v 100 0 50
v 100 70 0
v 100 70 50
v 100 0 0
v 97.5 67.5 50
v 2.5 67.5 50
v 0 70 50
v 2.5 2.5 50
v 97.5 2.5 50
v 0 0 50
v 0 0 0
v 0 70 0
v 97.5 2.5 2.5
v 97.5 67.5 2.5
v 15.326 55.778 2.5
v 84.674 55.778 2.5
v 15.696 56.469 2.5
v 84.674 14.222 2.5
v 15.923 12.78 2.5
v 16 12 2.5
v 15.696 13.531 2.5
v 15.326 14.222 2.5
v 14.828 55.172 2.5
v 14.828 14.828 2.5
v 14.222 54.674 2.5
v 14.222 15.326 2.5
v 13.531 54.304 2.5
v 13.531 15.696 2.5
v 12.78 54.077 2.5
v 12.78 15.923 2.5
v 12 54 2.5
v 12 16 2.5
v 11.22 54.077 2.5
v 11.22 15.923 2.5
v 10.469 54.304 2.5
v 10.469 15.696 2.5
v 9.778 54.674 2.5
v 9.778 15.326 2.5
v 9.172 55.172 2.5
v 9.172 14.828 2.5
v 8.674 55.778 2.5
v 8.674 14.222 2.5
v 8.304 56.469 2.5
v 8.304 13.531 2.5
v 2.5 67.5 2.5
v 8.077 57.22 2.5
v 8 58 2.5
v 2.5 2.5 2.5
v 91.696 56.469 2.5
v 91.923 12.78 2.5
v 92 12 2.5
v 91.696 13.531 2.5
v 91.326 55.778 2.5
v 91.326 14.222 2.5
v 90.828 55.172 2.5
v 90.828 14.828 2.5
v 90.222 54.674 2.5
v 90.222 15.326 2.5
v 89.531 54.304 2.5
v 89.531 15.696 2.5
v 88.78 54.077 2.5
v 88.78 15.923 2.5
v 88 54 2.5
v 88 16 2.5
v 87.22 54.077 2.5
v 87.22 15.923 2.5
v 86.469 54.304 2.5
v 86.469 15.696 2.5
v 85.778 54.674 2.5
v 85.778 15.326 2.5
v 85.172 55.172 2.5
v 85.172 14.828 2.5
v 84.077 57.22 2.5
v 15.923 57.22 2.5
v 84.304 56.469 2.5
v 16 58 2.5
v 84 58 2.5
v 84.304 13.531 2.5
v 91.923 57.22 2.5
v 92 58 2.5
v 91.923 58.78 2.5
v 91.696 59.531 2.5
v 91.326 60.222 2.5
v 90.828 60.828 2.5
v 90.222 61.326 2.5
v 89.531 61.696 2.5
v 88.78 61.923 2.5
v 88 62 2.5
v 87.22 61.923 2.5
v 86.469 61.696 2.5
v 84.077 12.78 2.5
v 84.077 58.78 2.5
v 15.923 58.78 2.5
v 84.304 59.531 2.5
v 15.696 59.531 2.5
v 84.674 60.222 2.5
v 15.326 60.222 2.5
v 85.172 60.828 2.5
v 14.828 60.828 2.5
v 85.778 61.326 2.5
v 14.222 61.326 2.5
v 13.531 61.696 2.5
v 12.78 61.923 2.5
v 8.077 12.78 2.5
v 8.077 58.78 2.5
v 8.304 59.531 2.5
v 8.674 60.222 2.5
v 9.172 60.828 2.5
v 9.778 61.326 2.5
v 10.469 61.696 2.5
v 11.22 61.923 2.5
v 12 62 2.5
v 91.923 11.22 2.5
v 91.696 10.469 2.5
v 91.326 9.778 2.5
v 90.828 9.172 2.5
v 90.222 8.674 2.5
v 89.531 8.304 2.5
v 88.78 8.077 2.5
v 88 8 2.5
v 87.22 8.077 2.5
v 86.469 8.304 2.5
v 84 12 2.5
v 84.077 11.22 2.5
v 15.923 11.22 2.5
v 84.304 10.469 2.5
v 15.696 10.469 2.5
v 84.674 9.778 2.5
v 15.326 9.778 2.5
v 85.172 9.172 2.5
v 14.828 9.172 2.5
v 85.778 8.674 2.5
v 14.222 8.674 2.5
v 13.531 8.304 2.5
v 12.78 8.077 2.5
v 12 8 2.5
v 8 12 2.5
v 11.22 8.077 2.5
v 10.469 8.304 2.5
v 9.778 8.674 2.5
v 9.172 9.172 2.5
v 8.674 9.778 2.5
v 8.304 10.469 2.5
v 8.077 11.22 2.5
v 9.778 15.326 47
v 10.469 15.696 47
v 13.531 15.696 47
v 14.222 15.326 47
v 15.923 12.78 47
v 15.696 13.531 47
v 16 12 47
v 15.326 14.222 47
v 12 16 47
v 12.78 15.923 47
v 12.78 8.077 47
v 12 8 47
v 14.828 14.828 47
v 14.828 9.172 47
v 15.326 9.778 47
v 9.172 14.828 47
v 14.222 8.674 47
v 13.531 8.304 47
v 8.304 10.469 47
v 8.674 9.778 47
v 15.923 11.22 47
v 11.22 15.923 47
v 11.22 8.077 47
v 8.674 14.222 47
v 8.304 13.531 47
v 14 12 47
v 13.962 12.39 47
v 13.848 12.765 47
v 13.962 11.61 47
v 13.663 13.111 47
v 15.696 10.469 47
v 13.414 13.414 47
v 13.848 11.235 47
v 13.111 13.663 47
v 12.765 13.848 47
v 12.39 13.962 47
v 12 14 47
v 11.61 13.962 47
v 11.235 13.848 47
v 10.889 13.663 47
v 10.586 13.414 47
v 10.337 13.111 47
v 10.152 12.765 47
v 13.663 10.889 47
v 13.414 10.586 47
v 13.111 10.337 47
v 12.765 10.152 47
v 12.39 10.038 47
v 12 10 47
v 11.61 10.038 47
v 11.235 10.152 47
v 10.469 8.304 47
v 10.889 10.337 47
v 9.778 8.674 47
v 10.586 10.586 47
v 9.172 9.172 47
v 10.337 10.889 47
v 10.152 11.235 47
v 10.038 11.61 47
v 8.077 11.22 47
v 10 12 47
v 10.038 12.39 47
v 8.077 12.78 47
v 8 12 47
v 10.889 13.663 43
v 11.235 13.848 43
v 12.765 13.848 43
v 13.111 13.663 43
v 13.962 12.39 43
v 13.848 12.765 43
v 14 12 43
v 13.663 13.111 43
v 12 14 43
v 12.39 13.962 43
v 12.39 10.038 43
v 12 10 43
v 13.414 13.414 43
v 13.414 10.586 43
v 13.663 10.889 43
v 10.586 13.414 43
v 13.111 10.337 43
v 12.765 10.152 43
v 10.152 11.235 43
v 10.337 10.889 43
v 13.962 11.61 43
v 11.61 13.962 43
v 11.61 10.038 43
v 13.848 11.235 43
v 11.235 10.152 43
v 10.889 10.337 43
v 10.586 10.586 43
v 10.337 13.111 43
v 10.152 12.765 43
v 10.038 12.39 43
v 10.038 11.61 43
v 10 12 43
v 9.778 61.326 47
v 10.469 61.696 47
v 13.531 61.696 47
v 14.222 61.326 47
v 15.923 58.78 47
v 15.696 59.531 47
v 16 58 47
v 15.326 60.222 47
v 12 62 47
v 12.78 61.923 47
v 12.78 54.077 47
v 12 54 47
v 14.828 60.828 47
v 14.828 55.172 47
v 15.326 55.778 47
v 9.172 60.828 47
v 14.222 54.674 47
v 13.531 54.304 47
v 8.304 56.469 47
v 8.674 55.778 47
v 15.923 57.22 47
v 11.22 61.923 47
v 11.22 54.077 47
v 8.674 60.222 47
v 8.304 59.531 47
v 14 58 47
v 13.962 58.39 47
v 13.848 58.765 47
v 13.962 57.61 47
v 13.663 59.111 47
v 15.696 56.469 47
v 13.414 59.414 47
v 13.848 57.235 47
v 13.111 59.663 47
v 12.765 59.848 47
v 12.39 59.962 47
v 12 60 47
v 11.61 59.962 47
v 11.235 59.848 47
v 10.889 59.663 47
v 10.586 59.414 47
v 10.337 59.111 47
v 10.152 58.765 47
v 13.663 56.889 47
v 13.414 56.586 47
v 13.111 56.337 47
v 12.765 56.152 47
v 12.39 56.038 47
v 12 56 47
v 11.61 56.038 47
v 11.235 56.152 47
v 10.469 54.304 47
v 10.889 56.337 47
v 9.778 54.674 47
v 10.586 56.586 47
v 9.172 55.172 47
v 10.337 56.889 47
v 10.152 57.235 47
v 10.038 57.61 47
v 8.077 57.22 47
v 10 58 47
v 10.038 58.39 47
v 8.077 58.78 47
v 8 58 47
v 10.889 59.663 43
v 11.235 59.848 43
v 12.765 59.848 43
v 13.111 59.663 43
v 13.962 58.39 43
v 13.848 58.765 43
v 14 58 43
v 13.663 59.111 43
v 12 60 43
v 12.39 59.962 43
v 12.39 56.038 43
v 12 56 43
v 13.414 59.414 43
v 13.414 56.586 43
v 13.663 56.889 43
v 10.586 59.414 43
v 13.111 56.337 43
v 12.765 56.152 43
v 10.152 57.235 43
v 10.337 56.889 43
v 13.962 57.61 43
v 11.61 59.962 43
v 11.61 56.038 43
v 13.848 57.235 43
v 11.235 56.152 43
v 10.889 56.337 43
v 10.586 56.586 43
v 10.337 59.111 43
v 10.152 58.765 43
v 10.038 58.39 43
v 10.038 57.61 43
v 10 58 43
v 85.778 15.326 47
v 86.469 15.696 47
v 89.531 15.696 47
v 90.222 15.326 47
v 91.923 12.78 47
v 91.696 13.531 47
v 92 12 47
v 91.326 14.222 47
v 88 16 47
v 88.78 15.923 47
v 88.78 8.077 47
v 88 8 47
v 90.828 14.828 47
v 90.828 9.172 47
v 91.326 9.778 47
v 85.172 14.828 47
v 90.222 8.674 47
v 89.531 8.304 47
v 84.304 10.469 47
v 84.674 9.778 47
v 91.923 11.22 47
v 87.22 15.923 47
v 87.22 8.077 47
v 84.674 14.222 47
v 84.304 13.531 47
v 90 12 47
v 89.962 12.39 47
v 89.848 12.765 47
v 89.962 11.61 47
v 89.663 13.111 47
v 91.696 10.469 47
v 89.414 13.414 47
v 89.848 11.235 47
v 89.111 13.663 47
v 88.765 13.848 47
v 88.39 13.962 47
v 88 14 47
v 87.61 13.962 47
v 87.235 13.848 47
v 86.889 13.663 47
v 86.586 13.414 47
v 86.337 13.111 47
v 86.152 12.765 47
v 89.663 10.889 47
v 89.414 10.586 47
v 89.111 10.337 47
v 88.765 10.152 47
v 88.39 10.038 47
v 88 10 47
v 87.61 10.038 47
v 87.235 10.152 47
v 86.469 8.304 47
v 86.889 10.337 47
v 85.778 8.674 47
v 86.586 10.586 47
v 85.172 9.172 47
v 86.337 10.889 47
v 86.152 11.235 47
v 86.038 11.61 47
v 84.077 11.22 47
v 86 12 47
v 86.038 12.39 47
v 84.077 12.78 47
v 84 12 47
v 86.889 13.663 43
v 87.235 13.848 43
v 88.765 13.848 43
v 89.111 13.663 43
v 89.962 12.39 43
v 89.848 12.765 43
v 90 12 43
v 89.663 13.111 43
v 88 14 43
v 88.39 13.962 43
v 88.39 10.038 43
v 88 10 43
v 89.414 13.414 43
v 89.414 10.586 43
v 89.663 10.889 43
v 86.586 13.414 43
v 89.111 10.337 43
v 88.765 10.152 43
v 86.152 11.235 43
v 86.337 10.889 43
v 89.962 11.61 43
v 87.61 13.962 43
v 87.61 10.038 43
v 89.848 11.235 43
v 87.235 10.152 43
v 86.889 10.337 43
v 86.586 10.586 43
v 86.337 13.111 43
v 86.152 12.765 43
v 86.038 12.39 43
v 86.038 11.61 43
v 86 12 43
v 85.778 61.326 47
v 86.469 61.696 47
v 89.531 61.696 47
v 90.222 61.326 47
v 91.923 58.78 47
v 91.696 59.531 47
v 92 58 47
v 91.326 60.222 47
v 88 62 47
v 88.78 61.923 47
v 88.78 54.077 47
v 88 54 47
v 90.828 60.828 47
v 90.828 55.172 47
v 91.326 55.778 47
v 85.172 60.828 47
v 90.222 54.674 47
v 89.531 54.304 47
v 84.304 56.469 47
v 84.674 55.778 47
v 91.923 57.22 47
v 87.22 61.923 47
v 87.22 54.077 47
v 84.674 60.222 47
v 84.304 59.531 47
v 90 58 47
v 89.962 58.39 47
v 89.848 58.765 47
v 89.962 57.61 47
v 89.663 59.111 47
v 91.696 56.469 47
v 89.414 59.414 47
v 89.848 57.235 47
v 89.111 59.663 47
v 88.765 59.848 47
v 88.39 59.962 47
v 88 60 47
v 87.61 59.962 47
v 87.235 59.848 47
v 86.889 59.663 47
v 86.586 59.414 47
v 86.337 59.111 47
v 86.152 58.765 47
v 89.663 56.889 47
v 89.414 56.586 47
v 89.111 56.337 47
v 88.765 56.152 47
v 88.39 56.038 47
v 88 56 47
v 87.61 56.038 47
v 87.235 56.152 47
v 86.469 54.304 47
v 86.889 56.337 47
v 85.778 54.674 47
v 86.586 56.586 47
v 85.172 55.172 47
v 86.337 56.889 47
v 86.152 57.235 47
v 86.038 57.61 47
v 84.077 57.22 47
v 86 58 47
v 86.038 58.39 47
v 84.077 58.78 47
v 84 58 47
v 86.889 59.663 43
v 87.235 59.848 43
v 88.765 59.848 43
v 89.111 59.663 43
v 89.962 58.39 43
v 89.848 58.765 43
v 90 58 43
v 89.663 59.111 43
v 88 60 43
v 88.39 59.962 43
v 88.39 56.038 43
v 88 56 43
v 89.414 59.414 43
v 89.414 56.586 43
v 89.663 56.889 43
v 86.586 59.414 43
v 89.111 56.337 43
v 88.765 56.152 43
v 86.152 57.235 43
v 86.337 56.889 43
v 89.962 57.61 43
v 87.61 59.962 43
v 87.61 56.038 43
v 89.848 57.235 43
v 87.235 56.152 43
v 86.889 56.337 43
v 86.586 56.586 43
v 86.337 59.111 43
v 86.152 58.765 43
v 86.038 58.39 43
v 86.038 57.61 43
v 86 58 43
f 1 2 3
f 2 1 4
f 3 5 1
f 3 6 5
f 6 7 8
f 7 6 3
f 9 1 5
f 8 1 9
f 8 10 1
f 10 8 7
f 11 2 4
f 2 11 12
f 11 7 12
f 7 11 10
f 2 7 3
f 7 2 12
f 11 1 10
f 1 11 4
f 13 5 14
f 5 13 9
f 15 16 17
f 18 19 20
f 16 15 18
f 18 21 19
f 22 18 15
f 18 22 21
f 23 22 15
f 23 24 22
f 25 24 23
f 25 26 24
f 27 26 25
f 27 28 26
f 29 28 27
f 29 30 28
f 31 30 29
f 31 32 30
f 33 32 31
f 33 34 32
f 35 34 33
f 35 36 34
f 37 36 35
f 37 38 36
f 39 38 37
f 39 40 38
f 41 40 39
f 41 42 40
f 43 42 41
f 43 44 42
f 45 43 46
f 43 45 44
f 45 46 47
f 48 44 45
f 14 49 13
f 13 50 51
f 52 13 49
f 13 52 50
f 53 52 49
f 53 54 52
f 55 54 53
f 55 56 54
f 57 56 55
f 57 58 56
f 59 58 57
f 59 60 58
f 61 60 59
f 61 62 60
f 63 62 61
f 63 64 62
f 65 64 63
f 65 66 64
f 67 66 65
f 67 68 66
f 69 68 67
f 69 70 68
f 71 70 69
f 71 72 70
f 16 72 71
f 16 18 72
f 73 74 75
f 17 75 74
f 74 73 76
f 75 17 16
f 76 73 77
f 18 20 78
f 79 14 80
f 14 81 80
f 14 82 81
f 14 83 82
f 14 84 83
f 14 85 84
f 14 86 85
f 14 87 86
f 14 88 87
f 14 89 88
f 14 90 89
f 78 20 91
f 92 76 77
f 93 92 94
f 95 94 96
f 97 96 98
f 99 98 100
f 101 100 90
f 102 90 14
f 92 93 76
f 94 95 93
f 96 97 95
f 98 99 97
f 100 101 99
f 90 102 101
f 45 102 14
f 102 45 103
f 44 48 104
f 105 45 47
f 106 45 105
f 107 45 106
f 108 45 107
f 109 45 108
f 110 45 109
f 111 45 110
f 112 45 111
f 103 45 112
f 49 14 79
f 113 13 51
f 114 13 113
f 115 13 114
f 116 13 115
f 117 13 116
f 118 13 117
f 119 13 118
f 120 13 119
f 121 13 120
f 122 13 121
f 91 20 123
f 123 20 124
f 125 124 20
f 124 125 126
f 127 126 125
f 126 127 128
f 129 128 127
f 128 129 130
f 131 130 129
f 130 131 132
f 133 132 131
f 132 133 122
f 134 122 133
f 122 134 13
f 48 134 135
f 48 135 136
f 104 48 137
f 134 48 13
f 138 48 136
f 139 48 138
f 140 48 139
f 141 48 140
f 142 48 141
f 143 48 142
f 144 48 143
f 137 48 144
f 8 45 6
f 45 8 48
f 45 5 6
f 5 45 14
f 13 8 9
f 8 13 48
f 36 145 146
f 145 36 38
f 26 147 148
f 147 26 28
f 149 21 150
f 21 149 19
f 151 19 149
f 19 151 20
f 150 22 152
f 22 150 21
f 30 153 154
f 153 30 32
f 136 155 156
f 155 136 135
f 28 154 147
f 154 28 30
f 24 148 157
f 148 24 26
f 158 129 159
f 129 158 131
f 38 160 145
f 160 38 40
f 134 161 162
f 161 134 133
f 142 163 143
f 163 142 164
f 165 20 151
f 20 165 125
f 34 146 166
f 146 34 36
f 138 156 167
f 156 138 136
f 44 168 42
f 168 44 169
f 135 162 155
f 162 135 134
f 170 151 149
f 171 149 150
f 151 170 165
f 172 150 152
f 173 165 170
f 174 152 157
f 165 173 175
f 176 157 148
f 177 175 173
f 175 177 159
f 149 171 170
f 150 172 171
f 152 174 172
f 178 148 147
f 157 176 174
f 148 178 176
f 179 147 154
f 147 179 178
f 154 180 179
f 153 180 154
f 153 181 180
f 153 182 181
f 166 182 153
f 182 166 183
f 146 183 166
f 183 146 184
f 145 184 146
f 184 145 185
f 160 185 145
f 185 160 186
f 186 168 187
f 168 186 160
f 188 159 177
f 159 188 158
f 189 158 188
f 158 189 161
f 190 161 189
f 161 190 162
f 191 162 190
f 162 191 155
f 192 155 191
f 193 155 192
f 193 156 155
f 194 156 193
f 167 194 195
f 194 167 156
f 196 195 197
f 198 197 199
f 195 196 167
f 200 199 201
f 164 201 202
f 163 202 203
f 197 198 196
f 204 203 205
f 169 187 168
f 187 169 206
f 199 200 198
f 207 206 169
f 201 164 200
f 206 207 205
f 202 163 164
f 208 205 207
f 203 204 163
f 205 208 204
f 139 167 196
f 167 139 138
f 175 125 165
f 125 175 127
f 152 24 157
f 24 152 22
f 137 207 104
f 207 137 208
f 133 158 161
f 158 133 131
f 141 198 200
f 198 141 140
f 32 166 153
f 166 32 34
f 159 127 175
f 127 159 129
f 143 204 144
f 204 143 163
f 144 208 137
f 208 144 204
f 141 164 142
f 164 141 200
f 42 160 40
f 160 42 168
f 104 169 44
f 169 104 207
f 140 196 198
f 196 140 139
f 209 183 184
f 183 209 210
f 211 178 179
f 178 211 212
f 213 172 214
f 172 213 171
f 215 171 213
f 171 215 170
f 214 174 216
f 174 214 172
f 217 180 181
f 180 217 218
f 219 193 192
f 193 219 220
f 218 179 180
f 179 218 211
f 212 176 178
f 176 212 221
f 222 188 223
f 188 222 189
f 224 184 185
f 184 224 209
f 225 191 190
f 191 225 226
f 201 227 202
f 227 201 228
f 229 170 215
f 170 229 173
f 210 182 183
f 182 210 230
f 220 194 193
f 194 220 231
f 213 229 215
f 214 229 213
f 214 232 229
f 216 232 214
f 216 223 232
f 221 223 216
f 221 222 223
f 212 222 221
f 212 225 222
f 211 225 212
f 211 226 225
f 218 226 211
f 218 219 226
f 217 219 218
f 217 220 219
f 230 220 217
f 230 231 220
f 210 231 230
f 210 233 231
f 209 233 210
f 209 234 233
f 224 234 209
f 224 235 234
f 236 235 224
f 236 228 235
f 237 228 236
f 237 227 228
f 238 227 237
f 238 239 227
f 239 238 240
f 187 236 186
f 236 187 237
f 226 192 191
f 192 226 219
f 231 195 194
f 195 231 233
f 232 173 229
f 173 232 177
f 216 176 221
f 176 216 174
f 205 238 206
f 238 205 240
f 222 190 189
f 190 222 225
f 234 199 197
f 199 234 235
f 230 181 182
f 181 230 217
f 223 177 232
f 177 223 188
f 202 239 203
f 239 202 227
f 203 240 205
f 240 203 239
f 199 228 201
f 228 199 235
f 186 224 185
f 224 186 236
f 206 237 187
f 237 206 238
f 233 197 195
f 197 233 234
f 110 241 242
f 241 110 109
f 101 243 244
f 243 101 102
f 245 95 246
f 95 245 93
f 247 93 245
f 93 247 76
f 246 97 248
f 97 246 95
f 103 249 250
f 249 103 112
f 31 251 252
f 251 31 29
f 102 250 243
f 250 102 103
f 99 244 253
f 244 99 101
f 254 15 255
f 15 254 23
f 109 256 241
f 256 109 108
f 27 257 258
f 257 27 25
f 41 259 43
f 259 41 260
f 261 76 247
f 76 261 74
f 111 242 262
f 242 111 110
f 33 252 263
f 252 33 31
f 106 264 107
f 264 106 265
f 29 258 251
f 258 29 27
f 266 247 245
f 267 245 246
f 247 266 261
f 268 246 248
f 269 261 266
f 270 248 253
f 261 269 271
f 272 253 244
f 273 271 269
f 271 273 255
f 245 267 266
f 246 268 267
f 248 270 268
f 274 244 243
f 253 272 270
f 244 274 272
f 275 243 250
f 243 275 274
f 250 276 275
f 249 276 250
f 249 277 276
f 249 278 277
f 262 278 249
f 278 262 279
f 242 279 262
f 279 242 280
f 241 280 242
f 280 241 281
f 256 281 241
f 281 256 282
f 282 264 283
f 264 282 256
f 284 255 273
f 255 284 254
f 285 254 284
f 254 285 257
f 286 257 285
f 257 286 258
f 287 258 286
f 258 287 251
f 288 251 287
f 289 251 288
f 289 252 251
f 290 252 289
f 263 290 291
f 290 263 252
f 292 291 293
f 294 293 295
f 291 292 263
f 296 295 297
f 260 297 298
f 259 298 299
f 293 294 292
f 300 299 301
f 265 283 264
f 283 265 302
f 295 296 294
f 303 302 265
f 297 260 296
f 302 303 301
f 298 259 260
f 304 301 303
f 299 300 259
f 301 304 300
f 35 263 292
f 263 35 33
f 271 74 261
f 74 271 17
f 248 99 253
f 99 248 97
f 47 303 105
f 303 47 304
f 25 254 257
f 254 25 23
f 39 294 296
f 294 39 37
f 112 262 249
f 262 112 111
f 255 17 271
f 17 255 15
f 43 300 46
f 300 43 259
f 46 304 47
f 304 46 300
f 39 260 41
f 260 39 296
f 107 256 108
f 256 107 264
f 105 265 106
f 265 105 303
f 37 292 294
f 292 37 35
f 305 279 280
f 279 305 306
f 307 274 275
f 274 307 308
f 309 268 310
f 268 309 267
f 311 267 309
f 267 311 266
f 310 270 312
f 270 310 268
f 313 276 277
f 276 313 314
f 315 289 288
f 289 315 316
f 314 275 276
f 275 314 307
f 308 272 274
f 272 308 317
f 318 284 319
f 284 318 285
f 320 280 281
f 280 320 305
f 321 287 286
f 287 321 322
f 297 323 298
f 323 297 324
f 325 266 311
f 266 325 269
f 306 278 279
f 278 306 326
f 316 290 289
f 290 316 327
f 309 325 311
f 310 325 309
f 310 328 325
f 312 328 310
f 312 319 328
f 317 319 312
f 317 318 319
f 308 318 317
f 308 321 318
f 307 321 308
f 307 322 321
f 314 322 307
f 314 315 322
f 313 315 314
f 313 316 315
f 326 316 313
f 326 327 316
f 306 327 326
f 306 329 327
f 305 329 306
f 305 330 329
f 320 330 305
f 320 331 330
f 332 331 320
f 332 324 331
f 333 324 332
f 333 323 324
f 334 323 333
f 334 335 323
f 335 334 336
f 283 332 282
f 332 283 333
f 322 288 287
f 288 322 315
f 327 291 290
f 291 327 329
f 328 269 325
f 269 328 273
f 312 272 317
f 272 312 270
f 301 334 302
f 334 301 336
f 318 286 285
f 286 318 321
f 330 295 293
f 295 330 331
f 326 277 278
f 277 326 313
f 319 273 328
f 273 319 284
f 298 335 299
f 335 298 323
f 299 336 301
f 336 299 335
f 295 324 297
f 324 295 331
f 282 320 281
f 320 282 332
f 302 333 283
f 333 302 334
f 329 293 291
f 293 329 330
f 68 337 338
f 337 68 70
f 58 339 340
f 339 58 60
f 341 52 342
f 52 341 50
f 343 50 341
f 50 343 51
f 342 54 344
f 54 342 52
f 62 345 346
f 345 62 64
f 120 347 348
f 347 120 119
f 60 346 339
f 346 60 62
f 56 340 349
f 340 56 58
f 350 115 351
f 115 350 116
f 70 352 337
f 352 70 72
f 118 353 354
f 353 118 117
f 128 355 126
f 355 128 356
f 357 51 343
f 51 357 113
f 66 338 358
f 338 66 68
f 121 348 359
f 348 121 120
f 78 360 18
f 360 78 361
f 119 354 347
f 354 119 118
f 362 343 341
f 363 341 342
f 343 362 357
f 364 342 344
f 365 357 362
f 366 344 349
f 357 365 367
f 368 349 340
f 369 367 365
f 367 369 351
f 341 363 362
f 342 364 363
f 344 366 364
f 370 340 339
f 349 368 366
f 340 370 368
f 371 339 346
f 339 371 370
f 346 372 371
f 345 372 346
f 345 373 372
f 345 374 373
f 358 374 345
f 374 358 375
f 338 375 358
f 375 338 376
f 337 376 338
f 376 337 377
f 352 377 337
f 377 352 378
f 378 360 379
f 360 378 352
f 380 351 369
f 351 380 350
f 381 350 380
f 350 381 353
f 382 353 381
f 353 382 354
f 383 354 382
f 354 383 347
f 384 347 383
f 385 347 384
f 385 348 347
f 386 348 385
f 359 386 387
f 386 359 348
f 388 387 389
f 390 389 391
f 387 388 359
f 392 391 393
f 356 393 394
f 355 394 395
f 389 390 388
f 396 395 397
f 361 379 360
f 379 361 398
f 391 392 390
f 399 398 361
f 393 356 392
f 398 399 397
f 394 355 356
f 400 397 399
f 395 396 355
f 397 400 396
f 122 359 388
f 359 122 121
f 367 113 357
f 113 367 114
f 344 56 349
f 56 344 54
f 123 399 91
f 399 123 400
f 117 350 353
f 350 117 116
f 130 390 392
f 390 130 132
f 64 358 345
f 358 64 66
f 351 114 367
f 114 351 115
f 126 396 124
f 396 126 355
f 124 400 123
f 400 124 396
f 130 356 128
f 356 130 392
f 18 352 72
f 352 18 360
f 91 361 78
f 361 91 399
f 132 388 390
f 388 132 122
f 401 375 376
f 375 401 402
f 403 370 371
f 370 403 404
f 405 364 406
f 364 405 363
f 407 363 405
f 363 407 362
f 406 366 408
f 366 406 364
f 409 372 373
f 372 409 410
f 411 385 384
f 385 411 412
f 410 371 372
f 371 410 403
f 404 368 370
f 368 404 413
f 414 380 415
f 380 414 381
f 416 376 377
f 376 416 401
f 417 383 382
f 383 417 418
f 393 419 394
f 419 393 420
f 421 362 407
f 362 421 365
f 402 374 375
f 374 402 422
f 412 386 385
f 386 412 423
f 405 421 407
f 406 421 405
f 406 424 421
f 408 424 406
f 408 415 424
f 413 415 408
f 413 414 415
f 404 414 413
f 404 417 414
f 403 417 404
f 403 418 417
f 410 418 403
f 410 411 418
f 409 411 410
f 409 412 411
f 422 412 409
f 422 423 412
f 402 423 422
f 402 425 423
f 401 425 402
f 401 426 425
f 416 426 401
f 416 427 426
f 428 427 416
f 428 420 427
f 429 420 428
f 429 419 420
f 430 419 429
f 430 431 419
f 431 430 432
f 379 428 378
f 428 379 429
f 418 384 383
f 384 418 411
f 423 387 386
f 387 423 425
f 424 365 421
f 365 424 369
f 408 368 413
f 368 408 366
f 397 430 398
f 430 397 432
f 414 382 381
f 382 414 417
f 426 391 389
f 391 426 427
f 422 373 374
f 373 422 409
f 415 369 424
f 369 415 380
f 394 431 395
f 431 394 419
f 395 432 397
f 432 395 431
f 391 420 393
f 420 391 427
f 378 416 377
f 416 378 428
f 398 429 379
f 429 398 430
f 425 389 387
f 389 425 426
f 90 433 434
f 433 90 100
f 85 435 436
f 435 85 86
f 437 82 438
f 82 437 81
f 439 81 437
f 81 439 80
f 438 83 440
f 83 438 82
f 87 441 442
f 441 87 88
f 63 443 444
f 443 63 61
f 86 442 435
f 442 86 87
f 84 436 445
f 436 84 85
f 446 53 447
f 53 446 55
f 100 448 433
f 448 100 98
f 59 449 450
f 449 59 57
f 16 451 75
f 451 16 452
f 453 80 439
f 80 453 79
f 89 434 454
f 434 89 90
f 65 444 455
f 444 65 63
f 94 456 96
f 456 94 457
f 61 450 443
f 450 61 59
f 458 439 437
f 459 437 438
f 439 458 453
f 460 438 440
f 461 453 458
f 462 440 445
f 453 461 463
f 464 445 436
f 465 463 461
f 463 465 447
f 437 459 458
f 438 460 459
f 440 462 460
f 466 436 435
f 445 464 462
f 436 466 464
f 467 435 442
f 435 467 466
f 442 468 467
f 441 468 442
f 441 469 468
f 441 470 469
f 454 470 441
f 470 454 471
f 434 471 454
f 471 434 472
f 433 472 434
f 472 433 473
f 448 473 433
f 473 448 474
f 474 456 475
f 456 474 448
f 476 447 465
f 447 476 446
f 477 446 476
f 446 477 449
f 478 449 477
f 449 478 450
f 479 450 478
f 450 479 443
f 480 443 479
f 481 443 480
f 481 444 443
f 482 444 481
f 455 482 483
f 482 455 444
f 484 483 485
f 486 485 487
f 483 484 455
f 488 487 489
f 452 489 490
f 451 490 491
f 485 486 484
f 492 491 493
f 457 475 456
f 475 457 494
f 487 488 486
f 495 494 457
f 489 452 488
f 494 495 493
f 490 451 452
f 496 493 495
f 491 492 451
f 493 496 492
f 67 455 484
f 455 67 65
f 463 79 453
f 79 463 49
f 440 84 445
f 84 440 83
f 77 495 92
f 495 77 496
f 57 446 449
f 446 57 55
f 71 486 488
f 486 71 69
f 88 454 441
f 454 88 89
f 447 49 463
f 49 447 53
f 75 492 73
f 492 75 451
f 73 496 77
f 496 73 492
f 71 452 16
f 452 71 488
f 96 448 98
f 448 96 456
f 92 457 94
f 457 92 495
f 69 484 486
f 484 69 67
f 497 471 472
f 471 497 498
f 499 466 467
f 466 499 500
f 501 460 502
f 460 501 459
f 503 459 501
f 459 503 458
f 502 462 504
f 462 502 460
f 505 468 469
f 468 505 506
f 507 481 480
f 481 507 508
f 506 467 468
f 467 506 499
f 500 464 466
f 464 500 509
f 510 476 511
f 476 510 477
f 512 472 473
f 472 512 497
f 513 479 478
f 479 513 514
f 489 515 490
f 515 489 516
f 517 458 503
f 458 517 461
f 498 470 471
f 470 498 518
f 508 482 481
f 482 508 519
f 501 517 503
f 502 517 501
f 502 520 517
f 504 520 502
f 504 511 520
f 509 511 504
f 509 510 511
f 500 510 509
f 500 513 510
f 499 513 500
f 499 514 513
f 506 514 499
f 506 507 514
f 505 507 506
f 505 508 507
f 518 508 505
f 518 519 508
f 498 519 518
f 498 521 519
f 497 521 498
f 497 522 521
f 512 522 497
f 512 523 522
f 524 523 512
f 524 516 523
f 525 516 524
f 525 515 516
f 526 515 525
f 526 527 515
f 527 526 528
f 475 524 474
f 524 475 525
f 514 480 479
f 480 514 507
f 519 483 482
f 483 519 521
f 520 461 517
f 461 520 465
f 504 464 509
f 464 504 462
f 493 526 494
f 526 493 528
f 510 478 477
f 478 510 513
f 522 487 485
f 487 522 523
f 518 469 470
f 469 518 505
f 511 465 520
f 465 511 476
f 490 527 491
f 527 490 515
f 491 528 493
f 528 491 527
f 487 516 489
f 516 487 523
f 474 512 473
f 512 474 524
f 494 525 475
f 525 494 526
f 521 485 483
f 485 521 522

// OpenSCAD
$fn = 32;

// ----------------------------------------------------------------------
// Enclosure box: bosses enclosure
// ----------------------------------------------------------------------

// --- parameters (mm) ---
box_l = 100;              // outer length, X
box_w = 70;               // outer width, Y
box_h = 50;               // outer height
wall_t = 2.5;             // wall thickness
boss_r = 4;               // corner boss radius
hole_r = 2;               // boss screw hole radius
boss_in = 12;             // boss inset from the corners

inner_h = box_h - wall_t;  // cavity depth
boss_h = inner_h - 2;  // corner boss height

difference() {
  union() {
    difference() {
      cube([box_l, box_w, box_h]);
      translate([wall_t, wall_t, wall_t])
        cube([box_l - 2 * wall_t, box_w - 2 * wall_t, box_h]);
    }
    for (sx = [0, 1], sy = [0, 1])
      translate([sx ? box_l - boss_in : boss_in,
                 sy ? box_w - boss_in : boss_in, wall_t - 1])
        difference() {
          cylinder(r = boss_r, h = boss_h);
          translate([0, 0, boss_h - 4])
            cylinder(r = hole_r, h = 5);
        }
  }
}
